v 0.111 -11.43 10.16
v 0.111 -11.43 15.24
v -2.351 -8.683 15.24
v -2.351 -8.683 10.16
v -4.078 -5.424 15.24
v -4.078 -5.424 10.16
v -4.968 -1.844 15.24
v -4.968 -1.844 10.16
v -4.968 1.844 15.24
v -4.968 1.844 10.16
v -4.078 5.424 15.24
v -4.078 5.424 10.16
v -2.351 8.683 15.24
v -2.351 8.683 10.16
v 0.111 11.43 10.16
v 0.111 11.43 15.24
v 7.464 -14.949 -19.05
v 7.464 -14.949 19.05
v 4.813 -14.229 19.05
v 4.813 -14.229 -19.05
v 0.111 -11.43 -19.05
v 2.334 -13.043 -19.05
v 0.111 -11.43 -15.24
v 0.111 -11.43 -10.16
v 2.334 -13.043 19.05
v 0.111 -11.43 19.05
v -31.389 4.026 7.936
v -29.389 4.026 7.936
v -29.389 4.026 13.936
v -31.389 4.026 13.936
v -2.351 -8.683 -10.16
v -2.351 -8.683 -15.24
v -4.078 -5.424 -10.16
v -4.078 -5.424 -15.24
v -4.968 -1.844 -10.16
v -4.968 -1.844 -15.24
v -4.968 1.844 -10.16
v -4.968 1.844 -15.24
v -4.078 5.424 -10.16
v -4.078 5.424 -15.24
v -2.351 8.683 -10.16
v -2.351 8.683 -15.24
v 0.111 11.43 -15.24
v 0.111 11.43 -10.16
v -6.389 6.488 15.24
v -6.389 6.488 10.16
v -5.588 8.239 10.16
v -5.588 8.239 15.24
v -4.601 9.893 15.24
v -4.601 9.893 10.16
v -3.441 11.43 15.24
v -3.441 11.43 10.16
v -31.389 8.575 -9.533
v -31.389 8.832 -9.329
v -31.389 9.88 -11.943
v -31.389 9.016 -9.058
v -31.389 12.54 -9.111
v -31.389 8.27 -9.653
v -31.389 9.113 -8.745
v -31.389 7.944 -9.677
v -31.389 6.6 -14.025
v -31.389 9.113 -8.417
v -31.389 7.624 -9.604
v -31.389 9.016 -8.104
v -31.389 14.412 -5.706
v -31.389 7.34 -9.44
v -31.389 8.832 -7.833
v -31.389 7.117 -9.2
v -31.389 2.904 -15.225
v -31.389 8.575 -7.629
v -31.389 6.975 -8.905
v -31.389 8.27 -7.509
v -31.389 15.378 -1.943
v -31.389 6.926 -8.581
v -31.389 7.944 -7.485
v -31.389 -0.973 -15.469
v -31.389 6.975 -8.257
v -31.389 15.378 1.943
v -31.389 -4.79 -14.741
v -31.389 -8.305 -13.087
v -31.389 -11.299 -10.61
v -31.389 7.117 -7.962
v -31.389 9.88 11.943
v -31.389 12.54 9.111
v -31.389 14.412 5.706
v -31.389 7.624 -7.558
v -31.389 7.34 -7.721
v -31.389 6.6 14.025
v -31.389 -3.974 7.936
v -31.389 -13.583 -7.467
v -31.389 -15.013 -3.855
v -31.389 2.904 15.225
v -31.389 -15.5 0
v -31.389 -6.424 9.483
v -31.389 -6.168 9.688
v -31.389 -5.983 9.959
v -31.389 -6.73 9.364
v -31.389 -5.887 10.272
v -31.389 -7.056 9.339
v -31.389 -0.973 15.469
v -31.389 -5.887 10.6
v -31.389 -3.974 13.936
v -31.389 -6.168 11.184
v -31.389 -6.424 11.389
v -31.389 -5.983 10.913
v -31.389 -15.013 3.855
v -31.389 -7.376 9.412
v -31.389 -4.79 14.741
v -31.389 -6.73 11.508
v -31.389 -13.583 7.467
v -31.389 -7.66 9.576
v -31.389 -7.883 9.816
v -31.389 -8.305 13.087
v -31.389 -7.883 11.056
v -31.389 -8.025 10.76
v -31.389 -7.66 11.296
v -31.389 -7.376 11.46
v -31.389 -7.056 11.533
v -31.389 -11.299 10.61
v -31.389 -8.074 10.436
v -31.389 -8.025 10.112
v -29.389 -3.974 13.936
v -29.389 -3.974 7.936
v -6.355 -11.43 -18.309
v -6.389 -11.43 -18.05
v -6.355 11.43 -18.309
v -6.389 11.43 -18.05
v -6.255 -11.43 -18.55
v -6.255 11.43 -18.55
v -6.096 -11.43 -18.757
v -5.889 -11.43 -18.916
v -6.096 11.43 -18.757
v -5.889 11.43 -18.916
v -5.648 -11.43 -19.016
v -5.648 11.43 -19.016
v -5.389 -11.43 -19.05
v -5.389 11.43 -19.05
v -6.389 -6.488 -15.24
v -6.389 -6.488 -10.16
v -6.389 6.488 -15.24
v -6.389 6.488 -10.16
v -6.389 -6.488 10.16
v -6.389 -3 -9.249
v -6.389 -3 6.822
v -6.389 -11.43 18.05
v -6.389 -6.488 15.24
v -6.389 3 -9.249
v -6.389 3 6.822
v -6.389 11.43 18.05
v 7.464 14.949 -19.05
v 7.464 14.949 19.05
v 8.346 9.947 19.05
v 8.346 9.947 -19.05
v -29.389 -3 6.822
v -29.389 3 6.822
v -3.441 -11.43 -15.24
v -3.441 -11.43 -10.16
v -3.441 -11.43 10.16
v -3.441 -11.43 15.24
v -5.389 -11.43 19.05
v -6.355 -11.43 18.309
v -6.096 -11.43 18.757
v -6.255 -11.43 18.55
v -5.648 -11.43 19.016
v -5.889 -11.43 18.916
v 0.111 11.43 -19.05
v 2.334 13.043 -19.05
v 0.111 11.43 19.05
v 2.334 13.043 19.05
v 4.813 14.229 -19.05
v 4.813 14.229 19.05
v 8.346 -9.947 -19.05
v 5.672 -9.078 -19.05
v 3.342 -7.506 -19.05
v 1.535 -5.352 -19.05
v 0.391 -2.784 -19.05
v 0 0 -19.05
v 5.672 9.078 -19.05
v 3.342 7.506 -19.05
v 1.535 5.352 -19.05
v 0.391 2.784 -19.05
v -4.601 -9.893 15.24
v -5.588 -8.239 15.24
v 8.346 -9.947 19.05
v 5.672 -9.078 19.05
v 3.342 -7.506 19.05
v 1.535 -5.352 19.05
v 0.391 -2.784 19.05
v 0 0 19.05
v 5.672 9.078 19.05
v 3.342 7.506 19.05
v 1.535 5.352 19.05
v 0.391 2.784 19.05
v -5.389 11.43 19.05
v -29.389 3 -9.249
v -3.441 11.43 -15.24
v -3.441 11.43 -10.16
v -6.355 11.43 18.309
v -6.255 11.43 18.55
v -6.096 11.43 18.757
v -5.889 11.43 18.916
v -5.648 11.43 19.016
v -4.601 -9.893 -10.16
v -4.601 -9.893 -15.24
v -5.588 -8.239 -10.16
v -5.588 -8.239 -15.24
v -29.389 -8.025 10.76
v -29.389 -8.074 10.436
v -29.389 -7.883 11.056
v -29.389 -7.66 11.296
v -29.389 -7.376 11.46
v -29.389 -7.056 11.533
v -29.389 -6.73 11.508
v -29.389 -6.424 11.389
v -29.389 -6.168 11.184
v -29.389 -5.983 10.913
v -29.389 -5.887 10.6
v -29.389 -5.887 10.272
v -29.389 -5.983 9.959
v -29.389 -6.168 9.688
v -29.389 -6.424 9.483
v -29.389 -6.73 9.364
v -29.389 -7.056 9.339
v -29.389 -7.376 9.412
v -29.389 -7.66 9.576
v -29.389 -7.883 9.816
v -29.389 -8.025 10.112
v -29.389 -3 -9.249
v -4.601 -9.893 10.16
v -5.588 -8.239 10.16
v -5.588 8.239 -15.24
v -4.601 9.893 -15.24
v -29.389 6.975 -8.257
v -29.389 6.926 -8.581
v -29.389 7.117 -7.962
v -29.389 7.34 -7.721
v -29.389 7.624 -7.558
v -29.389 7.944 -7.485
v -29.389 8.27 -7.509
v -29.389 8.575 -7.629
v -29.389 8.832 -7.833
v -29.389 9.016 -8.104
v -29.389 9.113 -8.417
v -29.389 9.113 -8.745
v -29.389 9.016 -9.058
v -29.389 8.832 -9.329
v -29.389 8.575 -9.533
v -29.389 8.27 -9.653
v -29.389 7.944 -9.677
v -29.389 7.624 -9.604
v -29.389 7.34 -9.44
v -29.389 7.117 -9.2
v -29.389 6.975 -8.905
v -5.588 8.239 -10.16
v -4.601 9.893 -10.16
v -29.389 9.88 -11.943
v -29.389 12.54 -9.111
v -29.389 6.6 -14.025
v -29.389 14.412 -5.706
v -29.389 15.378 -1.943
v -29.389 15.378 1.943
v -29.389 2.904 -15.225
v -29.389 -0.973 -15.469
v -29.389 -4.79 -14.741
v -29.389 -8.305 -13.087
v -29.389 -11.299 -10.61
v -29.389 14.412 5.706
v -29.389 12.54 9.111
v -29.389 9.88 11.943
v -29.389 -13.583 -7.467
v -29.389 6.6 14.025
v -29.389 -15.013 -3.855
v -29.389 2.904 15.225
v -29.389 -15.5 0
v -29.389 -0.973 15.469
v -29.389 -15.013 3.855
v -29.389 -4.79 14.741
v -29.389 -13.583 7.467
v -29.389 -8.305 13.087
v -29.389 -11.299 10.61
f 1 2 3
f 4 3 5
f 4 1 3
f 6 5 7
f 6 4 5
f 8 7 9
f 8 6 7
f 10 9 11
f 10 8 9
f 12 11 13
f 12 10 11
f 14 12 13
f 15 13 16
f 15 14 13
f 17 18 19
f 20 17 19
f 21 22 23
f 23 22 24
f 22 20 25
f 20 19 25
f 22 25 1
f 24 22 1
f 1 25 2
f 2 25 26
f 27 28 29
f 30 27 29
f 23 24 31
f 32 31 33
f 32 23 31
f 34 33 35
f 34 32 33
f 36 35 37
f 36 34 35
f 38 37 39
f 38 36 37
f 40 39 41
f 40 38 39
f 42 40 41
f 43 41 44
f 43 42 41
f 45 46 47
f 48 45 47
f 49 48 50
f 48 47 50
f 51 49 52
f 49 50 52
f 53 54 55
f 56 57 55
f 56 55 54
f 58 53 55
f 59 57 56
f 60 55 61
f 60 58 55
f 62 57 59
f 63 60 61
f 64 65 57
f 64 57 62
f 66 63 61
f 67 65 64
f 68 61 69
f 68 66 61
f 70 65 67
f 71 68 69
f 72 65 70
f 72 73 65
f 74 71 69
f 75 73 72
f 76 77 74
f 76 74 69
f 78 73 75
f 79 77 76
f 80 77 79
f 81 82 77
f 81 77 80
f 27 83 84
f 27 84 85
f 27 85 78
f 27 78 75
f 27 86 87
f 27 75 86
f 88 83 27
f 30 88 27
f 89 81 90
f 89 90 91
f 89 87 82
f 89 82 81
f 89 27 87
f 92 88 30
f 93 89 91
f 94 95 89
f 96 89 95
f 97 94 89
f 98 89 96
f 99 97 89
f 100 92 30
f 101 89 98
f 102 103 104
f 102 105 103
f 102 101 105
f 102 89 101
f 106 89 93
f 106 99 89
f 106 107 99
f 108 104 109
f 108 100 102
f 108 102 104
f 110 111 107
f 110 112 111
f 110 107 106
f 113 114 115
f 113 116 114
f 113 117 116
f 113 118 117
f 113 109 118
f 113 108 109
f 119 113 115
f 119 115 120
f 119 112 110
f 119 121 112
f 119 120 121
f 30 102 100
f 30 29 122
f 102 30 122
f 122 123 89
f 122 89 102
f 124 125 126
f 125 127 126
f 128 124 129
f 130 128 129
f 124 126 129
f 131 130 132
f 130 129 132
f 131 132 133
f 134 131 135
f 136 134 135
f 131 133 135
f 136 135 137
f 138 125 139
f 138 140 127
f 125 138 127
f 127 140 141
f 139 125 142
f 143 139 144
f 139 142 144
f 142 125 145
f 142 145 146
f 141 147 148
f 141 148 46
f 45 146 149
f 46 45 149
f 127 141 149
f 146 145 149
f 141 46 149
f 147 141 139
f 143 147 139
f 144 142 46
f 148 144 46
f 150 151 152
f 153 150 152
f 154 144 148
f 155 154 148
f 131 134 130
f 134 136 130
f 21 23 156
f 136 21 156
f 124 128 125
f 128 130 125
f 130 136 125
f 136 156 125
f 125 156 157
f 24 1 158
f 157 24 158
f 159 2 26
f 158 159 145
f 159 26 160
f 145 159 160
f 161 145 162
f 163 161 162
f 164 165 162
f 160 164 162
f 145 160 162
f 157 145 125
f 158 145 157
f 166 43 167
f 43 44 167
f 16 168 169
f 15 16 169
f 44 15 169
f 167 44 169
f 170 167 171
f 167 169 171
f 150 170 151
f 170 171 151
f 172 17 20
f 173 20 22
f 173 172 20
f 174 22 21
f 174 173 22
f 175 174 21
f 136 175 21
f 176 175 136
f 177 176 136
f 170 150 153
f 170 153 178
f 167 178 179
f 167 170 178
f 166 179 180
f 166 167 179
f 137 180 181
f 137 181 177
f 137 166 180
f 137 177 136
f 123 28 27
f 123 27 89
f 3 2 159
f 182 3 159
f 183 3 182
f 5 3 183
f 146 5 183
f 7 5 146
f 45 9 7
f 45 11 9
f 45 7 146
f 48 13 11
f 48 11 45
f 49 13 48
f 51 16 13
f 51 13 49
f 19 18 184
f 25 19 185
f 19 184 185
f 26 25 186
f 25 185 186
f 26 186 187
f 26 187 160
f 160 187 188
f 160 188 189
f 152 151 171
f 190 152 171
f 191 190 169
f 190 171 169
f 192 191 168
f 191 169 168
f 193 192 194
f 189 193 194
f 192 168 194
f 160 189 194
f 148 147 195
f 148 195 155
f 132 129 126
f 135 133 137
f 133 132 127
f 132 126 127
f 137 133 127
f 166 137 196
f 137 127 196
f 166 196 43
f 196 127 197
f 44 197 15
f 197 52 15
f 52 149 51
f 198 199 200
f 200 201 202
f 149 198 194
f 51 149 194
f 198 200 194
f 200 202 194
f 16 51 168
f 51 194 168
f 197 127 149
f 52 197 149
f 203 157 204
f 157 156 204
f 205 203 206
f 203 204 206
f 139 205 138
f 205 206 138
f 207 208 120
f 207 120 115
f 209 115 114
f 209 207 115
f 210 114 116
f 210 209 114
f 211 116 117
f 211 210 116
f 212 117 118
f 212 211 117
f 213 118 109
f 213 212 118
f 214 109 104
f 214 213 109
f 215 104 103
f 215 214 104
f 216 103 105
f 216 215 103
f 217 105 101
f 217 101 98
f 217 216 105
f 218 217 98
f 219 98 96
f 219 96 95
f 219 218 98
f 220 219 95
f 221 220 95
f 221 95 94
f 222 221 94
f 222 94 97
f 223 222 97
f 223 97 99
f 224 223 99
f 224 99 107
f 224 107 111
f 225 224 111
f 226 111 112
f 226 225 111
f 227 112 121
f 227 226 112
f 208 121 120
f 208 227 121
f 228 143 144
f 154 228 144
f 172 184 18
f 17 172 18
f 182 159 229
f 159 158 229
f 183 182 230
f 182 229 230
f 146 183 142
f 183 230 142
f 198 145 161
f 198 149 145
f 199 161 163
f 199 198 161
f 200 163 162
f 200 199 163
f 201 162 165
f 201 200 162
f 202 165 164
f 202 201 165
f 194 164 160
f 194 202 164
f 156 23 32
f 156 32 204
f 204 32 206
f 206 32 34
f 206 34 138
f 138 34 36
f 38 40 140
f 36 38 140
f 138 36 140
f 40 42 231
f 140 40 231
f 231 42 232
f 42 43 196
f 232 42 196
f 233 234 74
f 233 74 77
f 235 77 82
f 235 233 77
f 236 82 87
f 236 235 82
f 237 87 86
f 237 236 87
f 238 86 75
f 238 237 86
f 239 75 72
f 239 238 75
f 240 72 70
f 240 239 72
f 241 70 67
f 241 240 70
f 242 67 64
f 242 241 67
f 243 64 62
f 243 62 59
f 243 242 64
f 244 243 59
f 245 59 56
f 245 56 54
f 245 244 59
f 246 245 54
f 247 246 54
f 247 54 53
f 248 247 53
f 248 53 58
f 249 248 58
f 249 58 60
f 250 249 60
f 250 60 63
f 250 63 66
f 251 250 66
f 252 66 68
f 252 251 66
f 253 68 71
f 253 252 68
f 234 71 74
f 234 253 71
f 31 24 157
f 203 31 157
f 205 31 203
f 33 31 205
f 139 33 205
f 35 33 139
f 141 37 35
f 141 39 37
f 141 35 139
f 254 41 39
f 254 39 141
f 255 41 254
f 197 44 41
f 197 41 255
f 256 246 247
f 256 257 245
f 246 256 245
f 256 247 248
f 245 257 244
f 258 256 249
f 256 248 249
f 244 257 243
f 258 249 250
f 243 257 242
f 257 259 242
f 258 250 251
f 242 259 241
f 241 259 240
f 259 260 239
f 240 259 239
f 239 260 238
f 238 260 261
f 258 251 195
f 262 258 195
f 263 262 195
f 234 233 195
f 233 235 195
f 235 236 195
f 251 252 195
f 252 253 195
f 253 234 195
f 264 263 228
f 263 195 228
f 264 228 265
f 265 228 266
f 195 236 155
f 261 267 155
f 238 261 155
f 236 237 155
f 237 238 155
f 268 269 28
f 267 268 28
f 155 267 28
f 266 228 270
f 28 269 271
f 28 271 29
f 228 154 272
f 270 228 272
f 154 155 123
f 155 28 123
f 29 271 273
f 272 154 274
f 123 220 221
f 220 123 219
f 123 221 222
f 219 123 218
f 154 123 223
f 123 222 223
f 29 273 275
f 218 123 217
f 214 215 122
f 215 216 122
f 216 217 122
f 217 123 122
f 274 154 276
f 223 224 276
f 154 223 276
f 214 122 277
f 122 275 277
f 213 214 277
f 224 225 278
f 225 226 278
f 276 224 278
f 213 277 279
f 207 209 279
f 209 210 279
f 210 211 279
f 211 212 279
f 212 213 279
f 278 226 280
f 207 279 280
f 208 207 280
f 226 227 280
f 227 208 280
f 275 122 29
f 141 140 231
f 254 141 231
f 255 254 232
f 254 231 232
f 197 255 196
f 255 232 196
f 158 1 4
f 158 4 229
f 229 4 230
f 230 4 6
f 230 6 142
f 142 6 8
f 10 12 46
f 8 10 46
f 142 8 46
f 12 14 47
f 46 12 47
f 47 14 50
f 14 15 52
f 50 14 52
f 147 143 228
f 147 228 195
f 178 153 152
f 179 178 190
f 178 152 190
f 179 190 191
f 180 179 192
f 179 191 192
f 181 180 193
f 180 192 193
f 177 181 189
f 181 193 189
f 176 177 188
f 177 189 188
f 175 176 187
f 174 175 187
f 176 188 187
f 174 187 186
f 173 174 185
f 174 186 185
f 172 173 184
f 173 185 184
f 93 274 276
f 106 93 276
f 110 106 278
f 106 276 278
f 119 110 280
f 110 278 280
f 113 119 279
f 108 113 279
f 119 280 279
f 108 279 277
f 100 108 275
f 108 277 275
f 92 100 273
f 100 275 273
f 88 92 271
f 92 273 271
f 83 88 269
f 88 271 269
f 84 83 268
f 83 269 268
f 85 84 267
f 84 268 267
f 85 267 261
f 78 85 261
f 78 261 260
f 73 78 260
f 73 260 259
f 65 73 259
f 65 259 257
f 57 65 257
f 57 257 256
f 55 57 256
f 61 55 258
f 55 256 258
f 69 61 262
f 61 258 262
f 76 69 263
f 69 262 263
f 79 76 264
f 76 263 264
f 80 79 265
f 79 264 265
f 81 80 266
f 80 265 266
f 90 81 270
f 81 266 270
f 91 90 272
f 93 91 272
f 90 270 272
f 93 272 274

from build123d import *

# Parameters (mm, degrees)
BOSS_EXTRUDE1_DEPTH = 19.05
SKETCH6_W           = 16.071399664
SKETCH6_H           = 6
BOSS_EXTRUDE3_DEPTH = 23
SKETCH3_W           = 2.54
SKETCH3_H           = 5.08
SKETCH4_R           = 15.5
SKETCH4_R_2         = 1.099962386
SKETCH4_R_3         = 1.0993224
SKETCH4_W           = 8
SKETCH4_H           = 6
BOSS_EXTRUDE2_DEPTH = 2
FILLET1_R           = 1


with BuildPart() as part:
    # Sketch1 → Boss-Extrude1 (new body, symmetric)
    with BuildSketch(Plane.XY):
        with BuildLine():
            Line((8.346153406, -9.946558305), (7.464020663, -14.949381691))
            ThreePointArc((7.464020663, -14.949381691), (3.546652059, -13.692553844), (0.110630651, -11.43))
            Line((0.110630651, -11.43), (-6.389369349, -11.43))
            Line((-6.389369349, -11.43), (-6.389369349, 11.43))
            Line((-6.389369349, 11.43), (0.110630651, 11.43))
            ThreePointArc((0.110630651, 11.43), (3.546652059, 13.692553844), (7.464020663, 14.949381691))
            Line((7.464020663, 14.949381691), (8.346153406, 9.946558305))
            ThreePointArc((8.346153406, 9.946558305), (0, 0), (8.346153406, -9.946558305))
        make_face()
    extrude(amount=BOSS_EXTRUDE1_DEPTH, both=True)

    # Sketch6 → Boss-Extrude3 (add)
    with BuildSketch(Plane.ZY.offset(6.389369349)):
        with Locations((-1.213689559, 0)):
            Rectangle(SKETCH6_W, SKETCH6_H)
    extrude(amount=BOSS_EXTRUDE3_DEPTH)

    # Sketch3 → Cut-Revolve1 (revolve, cut)
    with BuildSketch(Plane(origin=(0, 0, 0), x_dir=(1, 0, 0), z_dir=(0, 1, 0))):
        with Locations((-6.35, 12.7)):
            Rectangle(SKETCH3_W, SKETCH3_H)
        with Locations((-6.35, -12.7)):
            Rectangle(SKETCH3_W, SKETCH3_H)
    revolve(axis=Axis((10.1, 0, 19.05), (0, 0, -1)), mode=Mode.SUBTRACT)

    # Sketch4 → Boss-Extrude2 (add)
    with BuildSketch(Plane(origin=(-29.389369349, 0, 0), x_dir=(0, -1, 0), z_dir=(-1, 0, 0))):
        Circle(SKETCH4_R)
        with Locations((6.97426488, 10.435972737)):
            Circle(SKETCH4_R_2, mode=Mode.SUBTRACT)
        with Locations((-8.02573512, -8.580948715)):
            Circle(SKETCH4_R_3, mode=Mode.SUBTRACT)
        with Locations((-0.025715642, 10.93618237)):
            Rectangle(SKETCH4_W, SKETCH4_H, mode=Mode.SUBTRACT)
    extrude(amount=BOSS_EXTRUDE2_DEPTH)

    # Fillet1
    fillet1_edges = [part.edges().sort_by_distance(p)[0] for p in [
        (-6.389369349, 0, 19.05),
        (-6.389369349, 0, -19.05),
    ]]
    fillet(fillet1_edges, radius=FILLET1_R)


solid = part.part
